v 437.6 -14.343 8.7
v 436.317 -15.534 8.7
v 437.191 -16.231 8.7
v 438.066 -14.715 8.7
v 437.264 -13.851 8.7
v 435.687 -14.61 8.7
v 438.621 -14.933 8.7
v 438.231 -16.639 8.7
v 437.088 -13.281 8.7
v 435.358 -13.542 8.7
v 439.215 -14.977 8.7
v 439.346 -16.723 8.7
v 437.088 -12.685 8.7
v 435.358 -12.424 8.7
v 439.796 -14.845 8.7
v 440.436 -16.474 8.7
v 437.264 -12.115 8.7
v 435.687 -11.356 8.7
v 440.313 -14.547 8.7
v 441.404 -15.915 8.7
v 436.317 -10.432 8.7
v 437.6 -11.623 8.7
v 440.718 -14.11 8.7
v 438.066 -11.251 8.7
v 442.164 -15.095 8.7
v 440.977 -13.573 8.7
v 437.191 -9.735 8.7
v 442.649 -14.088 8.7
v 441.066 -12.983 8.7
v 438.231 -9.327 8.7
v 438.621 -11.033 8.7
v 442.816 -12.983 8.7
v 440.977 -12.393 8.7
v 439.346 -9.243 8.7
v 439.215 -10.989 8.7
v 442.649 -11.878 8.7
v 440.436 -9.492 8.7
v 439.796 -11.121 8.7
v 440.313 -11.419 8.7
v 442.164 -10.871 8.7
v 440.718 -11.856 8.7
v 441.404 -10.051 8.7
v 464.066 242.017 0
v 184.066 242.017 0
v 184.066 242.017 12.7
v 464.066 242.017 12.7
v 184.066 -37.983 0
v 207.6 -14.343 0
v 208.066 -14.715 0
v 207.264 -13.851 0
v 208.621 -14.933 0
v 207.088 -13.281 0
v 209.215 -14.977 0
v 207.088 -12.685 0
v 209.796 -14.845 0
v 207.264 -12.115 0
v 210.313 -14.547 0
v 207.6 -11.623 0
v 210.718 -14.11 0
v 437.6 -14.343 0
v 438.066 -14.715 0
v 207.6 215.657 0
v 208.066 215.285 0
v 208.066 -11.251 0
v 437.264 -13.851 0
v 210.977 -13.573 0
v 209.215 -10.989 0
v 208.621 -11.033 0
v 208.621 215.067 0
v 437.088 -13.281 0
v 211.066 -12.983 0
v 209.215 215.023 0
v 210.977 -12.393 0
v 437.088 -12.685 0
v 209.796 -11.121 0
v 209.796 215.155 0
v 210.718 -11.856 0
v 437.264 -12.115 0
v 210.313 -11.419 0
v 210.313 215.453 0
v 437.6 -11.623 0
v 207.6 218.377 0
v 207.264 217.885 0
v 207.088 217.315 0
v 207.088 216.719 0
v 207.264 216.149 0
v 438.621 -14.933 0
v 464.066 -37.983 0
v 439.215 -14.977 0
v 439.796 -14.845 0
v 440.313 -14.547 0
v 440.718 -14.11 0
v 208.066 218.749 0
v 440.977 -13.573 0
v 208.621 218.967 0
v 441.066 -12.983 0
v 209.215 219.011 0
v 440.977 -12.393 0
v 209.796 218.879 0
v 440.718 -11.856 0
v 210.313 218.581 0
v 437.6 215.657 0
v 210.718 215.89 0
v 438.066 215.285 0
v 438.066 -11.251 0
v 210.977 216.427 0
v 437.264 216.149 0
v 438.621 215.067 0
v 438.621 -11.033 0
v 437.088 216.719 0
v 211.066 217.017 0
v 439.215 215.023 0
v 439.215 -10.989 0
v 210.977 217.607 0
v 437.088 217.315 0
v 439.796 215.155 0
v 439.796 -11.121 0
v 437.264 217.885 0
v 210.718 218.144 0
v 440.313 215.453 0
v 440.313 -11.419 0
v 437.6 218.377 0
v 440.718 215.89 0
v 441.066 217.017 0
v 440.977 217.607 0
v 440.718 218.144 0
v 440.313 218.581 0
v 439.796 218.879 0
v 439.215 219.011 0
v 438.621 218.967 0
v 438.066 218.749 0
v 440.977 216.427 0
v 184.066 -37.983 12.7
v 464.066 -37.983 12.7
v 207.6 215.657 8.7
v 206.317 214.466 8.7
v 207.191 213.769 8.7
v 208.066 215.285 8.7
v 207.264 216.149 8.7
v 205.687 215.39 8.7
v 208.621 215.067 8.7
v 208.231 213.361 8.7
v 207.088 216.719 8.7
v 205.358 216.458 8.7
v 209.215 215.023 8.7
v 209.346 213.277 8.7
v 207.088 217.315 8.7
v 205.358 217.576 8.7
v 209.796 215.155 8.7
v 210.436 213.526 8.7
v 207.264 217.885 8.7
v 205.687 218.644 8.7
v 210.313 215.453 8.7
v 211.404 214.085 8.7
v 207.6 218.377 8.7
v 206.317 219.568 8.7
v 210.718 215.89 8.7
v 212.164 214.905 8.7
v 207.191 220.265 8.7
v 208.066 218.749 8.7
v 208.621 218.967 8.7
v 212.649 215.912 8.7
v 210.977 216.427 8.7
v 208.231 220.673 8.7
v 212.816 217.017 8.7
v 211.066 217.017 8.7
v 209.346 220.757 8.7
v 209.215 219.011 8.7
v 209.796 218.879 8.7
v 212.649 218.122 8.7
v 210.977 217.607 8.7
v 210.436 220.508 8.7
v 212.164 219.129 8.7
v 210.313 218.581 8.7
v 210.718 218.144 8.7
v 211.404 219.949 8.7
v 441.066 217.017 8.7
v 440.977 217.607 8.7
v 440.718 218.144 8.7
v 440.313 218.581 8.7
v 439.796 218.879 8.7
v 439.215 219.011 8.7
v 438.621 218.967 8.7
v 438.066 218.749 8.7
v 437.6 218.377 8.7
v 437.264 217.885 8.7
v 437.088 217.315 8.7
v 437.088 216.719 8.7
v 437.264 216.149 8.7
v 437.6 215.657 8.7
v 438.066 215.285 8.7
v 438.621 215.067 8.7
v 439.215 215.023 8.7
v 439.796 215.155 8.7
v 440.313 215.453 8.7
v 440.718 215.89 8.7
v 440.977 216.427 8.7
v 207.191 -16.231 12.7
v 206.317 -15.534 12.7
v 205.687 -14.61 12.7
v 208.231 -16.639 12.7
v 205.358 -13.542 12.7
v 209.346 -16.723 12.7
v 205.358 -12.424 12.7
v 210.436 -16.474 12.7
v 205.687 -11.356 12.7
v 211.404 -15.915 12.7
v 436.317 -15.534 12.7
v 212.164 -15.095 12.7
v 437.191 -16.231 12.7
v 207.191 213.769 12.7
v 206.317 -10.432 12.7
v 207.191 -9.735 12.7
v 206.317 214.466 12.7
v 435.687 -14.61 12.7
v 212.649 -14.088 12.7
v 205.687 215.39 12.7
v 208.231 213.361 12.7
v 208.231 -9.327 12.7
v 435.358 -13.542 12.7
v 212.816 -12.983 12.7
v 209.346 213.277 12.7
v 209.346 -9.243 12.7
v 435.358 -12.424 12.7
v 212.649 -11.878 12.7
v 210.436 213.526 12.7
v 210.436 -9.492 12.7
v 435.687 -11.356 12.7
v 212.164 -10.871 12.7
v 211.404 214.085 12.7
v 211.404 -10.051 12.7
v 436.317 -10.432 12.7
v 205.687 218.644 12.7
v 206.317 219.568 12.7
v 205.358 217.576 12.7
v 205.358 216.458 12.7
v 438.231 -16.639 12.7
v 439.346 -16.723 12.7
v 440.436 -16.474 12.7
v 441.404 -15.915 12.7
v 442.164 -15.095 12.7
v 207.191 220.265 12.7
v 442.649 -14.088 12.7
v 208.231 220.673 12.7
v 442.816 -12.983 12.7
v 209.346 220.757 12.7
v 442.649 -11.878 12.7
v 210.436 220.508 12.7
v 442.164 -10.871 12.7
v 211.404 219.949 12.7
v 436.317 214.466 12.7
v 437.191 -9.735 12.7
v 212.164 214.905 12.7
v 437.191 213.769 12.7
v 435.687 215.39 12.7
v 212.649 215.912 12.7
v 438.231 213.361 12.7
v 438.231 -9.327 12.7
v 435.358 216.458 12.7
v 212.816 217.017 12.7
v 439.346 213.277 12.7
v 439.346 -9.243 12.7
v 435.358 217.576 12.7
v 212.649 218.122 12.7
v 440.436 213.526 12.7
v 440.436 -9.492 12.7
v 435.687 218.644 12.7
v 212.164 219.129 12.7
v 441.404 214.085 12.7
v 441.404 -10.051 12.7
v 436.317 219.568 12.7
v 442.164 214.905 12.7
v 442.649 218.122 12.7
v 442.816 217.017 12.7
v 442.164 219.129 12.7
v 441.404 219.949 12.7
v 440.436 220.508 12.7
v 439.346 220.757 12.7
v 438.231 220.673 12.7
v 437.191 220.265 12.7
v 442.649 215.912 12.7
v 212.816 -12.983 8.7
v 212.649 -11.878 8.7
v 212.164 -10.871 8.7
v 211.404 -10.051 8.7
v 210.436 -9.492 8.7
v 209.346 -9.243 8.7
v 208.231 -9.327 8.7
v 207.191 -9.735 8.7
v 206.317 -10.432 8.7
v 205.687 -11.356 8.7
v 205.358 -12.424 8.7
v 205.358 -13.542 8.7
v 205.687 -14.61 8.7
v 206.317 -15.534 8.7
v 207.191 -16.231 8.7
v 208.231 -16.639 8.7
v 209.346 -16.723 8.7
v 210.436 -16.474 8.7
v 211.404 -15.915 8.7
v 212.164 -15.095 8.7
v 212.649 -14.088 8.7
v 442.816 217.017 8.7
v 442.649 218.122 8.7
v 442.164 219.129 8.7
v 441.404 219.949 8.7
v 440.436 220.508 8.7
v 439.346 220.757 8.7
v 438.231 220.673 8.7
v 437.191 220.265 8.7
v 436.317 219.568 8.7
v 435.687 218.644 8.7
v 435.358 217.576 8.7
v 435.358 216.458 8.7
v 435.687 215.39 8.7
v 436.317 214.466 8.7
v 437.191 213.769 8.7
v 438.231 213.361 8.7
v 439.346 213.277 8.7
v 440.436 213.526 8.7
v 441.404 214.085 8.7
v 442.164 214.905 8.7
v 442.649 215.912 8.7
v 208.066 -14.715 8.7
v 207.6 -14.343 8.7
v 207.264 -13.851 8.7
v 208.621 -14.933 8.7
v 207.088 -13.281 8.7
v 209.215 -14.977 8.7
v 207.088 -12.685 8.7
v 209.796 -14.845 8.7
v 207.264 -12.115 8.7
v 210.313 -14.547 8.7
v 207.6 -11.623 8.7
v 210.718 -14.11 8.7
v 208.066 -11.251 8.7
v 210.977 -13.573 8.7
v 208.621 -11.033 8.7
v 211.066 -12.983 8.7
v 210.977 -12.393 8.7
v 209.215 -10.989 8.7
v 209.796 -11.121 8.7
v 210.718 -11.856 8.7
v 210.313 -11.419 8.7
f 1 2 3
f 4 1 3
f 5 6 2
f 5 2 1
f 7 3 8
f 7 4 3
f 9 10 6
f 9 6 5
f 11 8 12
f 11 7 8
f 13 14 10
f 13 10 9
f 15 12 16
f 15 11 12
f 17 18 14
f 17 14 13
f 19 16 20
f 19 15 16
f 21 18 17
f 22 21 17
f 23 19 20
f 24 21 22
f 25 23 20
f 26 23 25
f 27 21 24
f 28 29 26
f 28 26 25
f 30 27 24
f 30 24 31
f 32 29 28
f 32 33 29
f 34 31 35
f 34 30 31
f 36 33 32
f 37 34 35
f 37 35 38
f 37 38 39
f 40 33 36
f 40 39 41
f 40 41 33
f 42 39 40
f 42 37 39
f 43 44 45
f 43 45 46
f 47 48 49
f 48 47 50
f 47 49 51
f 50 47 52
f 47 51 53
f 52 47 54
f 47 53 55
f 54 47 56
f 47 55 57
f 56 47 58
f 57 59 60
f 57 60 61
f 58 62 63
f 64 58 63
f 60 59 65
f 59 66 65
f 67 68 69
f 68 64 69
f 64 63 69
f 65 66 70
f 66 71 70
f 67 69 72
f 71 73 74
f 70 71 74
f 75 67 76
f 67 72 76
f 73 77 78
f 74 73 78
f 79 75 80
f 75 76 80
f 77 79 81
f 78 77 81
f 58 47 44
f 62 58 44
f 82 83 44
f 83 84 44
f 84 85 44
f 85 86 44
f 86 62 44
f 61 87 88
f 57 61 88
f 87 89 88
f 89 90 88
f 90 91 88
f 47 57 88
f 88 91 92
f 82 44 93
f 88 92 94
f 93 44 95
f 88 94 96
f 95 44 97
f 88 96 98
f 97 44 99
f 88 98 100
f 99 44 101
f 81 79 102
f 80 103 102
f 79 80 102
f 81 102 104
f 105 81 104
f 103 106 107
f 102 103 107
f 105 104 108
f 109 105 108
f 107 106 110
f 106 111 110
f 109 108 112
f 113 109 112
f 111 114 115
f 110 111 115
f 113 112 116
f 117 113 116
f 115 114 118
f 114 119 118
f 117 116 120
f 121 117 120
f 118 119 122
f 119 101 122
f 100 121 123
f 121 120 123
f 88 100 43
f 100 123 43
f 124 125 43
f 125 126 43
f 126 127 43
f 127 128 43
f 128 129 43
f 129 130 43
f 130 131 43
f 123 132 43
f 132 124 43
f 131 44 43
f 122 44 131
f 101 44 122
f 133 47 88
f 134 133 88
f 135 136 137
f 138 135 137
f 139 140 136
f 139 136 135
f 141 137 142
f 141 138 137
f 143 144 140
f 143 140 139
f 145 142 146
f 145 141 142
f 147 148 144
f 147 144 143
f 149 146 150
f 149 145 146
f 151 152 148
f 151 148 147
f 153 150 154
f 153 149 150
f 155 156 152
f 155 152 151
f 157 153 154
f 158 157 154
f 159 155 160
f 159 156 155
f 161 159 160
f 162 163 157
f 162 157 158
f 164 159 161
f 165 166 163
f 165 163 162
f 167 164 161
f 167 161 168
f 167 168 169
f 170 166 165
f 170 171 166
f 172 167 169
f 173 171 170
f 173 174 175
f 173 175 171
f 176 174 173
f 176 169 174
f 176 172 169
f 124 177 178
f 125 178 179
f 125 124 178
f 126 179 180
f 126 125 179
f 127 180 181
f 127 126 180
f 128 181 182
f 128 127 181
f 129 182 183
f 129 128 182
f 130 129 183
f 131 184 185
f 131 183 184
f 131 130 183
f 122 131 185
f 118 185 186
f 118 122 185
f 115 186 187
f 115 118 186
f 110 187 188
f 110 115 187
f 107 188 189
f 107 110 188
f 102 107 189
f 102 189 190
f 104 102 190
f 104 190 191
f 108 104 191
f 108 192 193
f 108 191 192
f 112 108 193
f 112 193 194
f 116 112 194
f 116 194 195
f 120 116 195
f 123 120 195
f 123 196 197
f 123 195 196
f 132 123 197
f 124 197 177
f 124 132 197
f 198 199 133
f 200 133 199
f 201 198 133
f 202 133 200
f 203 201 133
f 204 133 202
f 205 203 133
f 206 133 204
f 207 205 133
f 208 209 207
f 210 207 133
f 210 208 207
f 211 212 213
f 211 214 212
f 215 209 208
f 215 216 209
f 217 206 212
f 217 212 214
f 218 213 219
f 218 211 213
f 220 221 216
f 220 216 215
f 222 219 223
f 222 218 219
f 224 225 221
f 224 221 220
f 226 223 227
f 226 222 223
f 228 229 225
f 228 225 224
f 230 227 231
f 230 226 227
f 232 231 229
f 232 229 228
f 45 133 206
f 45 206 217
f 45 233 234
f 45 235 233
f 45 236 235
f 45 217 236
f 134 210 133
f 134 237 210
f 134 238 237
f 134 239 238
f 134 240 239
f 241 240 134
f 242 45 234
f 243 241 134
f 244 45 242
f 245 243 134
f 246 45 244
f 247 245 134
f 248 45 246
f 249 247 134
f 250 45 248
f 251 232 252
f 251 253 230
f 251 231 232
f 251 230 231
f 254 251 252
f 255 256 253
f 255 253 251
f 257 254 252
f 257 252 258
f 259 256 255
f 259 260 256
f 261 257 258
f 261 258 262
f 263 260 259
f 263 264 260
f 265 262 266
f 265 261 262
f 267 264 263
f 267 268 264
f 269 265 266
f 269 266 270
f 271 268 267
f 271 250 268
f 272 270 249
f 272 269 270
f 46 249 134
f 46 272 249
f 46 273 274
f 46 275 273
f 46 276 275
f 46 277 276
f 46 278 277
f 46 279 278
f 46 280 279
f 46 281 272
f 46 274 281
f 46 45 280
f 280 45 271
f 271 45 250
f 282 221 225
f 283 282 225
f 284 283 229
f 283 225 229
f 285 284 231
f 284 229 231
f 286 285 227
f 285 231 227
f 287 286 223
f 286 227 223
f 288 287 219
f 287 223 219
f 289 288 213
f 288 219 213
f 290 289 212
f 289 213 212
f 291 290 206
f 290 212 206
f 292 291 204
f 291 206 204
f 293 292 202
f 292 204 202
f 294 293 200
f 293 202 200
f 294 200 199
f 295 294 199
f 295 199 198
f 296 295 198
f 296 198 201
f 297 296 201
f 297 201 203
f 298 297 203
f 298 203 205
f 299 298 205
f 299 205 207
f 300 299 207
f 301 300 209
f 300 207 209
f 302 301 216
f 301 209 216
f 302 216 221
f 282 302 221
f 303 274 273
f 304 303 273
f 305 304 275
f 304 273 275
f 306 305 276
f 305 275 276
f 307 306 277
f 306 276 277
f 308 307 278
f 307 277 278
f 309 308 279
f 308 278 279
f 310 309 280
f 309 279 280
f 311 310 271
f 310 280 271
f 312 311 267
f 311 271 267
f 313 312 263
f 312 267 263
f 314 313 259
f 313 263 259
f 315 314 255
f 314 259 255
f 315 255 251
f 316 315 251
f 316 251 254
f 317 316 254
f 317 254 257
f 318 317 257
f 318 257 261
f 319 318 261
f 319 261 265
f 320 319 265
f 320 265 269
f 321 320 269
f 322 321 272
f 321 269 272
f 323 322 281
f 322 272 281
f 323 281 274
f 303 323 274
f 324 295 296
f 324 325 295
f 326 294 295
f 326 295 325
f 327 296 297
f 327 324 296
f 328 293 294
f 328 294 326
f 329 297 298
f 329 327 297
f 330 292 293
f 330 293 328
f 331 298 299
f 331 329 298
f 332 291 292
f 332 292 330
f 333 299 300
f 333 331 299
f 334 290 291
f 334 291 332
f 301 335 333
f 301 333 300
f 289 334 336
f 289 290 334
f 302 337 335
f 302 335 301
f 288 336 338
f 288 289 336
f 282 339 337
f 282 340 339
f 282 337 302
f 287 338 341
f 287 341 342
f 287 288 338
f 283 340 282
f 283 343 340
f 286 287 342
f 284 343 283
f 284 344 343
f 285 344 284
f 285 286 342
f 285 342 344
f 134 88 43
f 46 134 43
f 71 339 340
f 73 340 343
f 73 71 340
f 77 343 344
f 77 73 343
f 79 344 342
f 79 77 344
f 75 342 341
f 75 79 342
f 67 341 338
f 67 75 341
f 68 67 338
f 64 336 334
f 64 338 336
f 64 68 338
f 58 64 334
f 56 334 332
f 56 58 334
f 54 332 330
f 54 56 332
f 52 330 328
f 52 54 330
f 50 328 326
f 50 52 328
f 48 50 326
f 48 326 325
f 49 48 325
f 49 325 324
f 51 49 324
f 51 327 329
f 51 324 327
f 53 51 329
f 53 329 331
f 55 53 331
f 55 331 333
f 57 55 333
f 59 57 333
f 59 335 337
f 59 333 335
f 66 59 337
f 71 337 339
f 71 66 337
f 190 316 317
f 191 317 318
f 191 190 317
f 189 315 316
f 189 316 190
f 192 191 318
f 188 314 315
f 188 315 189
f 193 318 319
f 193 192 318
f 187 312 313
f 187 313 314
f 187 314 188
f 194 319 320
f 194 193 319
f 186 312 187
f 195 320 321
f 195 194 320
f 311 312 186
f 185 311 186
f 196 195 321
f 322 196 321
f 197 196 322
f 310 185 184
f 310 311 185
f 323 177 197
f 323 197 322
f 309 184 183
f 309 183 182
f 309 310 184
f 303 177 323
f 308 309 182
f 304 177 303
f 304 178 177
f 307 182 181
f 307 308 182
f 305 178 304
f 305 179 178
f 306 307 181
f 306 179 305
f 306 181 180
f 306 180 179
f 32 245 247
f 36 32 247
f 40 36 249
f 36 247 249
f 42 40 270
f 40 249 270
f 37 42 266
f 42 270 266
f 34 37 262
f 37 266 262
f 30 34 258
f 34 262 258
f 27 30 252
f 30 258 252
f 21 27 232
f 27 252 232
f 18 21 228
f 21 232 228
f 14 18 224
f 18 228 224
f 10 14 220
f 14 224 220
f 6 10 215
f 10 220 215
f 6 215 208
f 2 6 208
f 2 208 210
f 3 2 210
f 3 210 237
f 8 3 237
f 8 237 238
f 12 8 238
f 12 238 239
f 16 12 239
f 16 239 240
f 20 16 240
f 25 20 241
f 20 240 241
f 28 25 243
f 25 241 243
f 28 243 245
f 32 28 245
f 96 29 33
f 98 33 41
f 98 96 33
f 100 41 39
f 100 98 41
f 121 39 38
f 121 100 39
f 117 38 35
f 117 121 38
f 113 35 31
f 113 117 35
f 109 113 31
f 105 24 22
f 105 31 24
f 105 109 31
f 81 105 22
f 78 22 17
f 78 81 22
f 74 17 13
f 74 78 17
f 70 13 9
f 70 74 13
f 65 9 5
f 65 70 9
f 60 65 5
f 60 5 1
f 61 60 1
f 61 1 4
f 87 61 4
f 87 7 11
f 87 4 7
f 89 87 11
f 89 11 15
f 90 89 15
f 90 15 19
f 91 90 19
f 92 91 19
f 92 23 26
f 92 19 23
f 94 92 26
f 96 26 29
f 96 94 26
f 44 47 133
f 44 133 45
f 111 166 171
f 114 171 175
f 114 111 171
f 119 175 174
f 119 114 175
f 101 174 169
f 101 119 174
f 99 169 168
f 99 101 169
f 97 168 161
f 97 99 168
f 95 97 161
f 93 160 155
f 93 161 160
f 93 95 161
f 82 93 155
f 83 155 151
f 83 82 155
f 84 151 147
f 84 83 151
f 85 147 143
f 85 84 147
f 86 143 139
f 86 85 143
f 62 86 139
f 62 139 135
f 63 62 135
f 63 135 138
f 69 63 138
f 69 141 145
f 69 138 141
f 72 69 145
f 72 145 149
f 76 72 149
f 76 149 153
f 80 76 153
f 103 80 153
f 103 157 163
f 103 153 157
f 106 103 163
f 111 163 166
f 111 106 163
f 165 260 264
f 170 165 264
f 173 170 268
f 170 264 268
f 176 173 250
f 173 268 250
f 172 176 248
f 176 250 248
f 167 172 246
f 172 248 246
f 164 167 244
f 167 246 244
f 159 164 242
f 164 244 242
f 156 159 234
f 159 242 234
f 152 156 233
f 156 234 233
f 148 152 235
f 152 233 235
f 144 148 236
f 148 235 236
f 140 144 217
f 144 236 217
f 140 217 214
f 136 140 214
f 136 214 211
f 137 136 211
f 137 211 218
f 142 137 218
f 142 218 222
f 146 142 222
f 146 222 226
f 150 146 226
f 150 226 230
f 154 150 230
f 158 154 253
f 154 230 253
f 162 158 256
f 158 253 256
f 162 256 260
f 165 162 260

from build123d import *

# Parameters (mm, degrees)
SKETCH1_W           = 280
SKETCH1_H           = 280
SKETCH1_R           = 2
BOSS_EXTRUDE1_DEPTH = 12.7
SKETCH2_R           = 3.75
CUT_EXTRUDE1_DEPTH  = 4


with BuildPart() as part:
    # Sketch1 → Boss-Extrude1 (new body)
    with BuildSketch(Plane.XY):
        with Locations((324.065660481, 102.017007569)):
            Rectangle(SKETCH1_W, SKETCH1_H)
        with Locations((209.065660481, 217.017007569)):
            Circle(SKETCH1_R, mode=Mode.SUBTRACT)
        with Locations((439.065660481, 217.017007569)):
            Circle(SKETCH1_R, mode=Mode.SUBTRACT)
        with Locations((439.065660481, -12.982992431)):
            Circle(SKETCH1_R, mode=Mode.SUBTRACT)
        with Locations((209.065660481, -12.982992431)):
            Circle(SKETCH1_R, mode=Mode.SUBTRACT)
    extrude(amount=BOSS_EXTRUDE1_DEPTH)

    # Sketch2 → Cut-Extrude1 (cut)
    with BuildSketch(Plane.XY.offset(12.7)):
        with Locations((209.065660481, -12.982992431)):
            Circle(SKETCH2_R)
        with Locations((209.065660481, 217.017007569)):
            Circle(SKETCH2_R)
        with Locations((439.065660481, 217.017007569)):
            Circle(SKETCH2_R)
        with Locations((439.065660481, -12.982992431)):
            Circle(SKETCH2_R)
    extrude(amount=-CUT_EXTRUDE1_DEPTH, mode=Mode.SUBTRACT)


solid = part.part
